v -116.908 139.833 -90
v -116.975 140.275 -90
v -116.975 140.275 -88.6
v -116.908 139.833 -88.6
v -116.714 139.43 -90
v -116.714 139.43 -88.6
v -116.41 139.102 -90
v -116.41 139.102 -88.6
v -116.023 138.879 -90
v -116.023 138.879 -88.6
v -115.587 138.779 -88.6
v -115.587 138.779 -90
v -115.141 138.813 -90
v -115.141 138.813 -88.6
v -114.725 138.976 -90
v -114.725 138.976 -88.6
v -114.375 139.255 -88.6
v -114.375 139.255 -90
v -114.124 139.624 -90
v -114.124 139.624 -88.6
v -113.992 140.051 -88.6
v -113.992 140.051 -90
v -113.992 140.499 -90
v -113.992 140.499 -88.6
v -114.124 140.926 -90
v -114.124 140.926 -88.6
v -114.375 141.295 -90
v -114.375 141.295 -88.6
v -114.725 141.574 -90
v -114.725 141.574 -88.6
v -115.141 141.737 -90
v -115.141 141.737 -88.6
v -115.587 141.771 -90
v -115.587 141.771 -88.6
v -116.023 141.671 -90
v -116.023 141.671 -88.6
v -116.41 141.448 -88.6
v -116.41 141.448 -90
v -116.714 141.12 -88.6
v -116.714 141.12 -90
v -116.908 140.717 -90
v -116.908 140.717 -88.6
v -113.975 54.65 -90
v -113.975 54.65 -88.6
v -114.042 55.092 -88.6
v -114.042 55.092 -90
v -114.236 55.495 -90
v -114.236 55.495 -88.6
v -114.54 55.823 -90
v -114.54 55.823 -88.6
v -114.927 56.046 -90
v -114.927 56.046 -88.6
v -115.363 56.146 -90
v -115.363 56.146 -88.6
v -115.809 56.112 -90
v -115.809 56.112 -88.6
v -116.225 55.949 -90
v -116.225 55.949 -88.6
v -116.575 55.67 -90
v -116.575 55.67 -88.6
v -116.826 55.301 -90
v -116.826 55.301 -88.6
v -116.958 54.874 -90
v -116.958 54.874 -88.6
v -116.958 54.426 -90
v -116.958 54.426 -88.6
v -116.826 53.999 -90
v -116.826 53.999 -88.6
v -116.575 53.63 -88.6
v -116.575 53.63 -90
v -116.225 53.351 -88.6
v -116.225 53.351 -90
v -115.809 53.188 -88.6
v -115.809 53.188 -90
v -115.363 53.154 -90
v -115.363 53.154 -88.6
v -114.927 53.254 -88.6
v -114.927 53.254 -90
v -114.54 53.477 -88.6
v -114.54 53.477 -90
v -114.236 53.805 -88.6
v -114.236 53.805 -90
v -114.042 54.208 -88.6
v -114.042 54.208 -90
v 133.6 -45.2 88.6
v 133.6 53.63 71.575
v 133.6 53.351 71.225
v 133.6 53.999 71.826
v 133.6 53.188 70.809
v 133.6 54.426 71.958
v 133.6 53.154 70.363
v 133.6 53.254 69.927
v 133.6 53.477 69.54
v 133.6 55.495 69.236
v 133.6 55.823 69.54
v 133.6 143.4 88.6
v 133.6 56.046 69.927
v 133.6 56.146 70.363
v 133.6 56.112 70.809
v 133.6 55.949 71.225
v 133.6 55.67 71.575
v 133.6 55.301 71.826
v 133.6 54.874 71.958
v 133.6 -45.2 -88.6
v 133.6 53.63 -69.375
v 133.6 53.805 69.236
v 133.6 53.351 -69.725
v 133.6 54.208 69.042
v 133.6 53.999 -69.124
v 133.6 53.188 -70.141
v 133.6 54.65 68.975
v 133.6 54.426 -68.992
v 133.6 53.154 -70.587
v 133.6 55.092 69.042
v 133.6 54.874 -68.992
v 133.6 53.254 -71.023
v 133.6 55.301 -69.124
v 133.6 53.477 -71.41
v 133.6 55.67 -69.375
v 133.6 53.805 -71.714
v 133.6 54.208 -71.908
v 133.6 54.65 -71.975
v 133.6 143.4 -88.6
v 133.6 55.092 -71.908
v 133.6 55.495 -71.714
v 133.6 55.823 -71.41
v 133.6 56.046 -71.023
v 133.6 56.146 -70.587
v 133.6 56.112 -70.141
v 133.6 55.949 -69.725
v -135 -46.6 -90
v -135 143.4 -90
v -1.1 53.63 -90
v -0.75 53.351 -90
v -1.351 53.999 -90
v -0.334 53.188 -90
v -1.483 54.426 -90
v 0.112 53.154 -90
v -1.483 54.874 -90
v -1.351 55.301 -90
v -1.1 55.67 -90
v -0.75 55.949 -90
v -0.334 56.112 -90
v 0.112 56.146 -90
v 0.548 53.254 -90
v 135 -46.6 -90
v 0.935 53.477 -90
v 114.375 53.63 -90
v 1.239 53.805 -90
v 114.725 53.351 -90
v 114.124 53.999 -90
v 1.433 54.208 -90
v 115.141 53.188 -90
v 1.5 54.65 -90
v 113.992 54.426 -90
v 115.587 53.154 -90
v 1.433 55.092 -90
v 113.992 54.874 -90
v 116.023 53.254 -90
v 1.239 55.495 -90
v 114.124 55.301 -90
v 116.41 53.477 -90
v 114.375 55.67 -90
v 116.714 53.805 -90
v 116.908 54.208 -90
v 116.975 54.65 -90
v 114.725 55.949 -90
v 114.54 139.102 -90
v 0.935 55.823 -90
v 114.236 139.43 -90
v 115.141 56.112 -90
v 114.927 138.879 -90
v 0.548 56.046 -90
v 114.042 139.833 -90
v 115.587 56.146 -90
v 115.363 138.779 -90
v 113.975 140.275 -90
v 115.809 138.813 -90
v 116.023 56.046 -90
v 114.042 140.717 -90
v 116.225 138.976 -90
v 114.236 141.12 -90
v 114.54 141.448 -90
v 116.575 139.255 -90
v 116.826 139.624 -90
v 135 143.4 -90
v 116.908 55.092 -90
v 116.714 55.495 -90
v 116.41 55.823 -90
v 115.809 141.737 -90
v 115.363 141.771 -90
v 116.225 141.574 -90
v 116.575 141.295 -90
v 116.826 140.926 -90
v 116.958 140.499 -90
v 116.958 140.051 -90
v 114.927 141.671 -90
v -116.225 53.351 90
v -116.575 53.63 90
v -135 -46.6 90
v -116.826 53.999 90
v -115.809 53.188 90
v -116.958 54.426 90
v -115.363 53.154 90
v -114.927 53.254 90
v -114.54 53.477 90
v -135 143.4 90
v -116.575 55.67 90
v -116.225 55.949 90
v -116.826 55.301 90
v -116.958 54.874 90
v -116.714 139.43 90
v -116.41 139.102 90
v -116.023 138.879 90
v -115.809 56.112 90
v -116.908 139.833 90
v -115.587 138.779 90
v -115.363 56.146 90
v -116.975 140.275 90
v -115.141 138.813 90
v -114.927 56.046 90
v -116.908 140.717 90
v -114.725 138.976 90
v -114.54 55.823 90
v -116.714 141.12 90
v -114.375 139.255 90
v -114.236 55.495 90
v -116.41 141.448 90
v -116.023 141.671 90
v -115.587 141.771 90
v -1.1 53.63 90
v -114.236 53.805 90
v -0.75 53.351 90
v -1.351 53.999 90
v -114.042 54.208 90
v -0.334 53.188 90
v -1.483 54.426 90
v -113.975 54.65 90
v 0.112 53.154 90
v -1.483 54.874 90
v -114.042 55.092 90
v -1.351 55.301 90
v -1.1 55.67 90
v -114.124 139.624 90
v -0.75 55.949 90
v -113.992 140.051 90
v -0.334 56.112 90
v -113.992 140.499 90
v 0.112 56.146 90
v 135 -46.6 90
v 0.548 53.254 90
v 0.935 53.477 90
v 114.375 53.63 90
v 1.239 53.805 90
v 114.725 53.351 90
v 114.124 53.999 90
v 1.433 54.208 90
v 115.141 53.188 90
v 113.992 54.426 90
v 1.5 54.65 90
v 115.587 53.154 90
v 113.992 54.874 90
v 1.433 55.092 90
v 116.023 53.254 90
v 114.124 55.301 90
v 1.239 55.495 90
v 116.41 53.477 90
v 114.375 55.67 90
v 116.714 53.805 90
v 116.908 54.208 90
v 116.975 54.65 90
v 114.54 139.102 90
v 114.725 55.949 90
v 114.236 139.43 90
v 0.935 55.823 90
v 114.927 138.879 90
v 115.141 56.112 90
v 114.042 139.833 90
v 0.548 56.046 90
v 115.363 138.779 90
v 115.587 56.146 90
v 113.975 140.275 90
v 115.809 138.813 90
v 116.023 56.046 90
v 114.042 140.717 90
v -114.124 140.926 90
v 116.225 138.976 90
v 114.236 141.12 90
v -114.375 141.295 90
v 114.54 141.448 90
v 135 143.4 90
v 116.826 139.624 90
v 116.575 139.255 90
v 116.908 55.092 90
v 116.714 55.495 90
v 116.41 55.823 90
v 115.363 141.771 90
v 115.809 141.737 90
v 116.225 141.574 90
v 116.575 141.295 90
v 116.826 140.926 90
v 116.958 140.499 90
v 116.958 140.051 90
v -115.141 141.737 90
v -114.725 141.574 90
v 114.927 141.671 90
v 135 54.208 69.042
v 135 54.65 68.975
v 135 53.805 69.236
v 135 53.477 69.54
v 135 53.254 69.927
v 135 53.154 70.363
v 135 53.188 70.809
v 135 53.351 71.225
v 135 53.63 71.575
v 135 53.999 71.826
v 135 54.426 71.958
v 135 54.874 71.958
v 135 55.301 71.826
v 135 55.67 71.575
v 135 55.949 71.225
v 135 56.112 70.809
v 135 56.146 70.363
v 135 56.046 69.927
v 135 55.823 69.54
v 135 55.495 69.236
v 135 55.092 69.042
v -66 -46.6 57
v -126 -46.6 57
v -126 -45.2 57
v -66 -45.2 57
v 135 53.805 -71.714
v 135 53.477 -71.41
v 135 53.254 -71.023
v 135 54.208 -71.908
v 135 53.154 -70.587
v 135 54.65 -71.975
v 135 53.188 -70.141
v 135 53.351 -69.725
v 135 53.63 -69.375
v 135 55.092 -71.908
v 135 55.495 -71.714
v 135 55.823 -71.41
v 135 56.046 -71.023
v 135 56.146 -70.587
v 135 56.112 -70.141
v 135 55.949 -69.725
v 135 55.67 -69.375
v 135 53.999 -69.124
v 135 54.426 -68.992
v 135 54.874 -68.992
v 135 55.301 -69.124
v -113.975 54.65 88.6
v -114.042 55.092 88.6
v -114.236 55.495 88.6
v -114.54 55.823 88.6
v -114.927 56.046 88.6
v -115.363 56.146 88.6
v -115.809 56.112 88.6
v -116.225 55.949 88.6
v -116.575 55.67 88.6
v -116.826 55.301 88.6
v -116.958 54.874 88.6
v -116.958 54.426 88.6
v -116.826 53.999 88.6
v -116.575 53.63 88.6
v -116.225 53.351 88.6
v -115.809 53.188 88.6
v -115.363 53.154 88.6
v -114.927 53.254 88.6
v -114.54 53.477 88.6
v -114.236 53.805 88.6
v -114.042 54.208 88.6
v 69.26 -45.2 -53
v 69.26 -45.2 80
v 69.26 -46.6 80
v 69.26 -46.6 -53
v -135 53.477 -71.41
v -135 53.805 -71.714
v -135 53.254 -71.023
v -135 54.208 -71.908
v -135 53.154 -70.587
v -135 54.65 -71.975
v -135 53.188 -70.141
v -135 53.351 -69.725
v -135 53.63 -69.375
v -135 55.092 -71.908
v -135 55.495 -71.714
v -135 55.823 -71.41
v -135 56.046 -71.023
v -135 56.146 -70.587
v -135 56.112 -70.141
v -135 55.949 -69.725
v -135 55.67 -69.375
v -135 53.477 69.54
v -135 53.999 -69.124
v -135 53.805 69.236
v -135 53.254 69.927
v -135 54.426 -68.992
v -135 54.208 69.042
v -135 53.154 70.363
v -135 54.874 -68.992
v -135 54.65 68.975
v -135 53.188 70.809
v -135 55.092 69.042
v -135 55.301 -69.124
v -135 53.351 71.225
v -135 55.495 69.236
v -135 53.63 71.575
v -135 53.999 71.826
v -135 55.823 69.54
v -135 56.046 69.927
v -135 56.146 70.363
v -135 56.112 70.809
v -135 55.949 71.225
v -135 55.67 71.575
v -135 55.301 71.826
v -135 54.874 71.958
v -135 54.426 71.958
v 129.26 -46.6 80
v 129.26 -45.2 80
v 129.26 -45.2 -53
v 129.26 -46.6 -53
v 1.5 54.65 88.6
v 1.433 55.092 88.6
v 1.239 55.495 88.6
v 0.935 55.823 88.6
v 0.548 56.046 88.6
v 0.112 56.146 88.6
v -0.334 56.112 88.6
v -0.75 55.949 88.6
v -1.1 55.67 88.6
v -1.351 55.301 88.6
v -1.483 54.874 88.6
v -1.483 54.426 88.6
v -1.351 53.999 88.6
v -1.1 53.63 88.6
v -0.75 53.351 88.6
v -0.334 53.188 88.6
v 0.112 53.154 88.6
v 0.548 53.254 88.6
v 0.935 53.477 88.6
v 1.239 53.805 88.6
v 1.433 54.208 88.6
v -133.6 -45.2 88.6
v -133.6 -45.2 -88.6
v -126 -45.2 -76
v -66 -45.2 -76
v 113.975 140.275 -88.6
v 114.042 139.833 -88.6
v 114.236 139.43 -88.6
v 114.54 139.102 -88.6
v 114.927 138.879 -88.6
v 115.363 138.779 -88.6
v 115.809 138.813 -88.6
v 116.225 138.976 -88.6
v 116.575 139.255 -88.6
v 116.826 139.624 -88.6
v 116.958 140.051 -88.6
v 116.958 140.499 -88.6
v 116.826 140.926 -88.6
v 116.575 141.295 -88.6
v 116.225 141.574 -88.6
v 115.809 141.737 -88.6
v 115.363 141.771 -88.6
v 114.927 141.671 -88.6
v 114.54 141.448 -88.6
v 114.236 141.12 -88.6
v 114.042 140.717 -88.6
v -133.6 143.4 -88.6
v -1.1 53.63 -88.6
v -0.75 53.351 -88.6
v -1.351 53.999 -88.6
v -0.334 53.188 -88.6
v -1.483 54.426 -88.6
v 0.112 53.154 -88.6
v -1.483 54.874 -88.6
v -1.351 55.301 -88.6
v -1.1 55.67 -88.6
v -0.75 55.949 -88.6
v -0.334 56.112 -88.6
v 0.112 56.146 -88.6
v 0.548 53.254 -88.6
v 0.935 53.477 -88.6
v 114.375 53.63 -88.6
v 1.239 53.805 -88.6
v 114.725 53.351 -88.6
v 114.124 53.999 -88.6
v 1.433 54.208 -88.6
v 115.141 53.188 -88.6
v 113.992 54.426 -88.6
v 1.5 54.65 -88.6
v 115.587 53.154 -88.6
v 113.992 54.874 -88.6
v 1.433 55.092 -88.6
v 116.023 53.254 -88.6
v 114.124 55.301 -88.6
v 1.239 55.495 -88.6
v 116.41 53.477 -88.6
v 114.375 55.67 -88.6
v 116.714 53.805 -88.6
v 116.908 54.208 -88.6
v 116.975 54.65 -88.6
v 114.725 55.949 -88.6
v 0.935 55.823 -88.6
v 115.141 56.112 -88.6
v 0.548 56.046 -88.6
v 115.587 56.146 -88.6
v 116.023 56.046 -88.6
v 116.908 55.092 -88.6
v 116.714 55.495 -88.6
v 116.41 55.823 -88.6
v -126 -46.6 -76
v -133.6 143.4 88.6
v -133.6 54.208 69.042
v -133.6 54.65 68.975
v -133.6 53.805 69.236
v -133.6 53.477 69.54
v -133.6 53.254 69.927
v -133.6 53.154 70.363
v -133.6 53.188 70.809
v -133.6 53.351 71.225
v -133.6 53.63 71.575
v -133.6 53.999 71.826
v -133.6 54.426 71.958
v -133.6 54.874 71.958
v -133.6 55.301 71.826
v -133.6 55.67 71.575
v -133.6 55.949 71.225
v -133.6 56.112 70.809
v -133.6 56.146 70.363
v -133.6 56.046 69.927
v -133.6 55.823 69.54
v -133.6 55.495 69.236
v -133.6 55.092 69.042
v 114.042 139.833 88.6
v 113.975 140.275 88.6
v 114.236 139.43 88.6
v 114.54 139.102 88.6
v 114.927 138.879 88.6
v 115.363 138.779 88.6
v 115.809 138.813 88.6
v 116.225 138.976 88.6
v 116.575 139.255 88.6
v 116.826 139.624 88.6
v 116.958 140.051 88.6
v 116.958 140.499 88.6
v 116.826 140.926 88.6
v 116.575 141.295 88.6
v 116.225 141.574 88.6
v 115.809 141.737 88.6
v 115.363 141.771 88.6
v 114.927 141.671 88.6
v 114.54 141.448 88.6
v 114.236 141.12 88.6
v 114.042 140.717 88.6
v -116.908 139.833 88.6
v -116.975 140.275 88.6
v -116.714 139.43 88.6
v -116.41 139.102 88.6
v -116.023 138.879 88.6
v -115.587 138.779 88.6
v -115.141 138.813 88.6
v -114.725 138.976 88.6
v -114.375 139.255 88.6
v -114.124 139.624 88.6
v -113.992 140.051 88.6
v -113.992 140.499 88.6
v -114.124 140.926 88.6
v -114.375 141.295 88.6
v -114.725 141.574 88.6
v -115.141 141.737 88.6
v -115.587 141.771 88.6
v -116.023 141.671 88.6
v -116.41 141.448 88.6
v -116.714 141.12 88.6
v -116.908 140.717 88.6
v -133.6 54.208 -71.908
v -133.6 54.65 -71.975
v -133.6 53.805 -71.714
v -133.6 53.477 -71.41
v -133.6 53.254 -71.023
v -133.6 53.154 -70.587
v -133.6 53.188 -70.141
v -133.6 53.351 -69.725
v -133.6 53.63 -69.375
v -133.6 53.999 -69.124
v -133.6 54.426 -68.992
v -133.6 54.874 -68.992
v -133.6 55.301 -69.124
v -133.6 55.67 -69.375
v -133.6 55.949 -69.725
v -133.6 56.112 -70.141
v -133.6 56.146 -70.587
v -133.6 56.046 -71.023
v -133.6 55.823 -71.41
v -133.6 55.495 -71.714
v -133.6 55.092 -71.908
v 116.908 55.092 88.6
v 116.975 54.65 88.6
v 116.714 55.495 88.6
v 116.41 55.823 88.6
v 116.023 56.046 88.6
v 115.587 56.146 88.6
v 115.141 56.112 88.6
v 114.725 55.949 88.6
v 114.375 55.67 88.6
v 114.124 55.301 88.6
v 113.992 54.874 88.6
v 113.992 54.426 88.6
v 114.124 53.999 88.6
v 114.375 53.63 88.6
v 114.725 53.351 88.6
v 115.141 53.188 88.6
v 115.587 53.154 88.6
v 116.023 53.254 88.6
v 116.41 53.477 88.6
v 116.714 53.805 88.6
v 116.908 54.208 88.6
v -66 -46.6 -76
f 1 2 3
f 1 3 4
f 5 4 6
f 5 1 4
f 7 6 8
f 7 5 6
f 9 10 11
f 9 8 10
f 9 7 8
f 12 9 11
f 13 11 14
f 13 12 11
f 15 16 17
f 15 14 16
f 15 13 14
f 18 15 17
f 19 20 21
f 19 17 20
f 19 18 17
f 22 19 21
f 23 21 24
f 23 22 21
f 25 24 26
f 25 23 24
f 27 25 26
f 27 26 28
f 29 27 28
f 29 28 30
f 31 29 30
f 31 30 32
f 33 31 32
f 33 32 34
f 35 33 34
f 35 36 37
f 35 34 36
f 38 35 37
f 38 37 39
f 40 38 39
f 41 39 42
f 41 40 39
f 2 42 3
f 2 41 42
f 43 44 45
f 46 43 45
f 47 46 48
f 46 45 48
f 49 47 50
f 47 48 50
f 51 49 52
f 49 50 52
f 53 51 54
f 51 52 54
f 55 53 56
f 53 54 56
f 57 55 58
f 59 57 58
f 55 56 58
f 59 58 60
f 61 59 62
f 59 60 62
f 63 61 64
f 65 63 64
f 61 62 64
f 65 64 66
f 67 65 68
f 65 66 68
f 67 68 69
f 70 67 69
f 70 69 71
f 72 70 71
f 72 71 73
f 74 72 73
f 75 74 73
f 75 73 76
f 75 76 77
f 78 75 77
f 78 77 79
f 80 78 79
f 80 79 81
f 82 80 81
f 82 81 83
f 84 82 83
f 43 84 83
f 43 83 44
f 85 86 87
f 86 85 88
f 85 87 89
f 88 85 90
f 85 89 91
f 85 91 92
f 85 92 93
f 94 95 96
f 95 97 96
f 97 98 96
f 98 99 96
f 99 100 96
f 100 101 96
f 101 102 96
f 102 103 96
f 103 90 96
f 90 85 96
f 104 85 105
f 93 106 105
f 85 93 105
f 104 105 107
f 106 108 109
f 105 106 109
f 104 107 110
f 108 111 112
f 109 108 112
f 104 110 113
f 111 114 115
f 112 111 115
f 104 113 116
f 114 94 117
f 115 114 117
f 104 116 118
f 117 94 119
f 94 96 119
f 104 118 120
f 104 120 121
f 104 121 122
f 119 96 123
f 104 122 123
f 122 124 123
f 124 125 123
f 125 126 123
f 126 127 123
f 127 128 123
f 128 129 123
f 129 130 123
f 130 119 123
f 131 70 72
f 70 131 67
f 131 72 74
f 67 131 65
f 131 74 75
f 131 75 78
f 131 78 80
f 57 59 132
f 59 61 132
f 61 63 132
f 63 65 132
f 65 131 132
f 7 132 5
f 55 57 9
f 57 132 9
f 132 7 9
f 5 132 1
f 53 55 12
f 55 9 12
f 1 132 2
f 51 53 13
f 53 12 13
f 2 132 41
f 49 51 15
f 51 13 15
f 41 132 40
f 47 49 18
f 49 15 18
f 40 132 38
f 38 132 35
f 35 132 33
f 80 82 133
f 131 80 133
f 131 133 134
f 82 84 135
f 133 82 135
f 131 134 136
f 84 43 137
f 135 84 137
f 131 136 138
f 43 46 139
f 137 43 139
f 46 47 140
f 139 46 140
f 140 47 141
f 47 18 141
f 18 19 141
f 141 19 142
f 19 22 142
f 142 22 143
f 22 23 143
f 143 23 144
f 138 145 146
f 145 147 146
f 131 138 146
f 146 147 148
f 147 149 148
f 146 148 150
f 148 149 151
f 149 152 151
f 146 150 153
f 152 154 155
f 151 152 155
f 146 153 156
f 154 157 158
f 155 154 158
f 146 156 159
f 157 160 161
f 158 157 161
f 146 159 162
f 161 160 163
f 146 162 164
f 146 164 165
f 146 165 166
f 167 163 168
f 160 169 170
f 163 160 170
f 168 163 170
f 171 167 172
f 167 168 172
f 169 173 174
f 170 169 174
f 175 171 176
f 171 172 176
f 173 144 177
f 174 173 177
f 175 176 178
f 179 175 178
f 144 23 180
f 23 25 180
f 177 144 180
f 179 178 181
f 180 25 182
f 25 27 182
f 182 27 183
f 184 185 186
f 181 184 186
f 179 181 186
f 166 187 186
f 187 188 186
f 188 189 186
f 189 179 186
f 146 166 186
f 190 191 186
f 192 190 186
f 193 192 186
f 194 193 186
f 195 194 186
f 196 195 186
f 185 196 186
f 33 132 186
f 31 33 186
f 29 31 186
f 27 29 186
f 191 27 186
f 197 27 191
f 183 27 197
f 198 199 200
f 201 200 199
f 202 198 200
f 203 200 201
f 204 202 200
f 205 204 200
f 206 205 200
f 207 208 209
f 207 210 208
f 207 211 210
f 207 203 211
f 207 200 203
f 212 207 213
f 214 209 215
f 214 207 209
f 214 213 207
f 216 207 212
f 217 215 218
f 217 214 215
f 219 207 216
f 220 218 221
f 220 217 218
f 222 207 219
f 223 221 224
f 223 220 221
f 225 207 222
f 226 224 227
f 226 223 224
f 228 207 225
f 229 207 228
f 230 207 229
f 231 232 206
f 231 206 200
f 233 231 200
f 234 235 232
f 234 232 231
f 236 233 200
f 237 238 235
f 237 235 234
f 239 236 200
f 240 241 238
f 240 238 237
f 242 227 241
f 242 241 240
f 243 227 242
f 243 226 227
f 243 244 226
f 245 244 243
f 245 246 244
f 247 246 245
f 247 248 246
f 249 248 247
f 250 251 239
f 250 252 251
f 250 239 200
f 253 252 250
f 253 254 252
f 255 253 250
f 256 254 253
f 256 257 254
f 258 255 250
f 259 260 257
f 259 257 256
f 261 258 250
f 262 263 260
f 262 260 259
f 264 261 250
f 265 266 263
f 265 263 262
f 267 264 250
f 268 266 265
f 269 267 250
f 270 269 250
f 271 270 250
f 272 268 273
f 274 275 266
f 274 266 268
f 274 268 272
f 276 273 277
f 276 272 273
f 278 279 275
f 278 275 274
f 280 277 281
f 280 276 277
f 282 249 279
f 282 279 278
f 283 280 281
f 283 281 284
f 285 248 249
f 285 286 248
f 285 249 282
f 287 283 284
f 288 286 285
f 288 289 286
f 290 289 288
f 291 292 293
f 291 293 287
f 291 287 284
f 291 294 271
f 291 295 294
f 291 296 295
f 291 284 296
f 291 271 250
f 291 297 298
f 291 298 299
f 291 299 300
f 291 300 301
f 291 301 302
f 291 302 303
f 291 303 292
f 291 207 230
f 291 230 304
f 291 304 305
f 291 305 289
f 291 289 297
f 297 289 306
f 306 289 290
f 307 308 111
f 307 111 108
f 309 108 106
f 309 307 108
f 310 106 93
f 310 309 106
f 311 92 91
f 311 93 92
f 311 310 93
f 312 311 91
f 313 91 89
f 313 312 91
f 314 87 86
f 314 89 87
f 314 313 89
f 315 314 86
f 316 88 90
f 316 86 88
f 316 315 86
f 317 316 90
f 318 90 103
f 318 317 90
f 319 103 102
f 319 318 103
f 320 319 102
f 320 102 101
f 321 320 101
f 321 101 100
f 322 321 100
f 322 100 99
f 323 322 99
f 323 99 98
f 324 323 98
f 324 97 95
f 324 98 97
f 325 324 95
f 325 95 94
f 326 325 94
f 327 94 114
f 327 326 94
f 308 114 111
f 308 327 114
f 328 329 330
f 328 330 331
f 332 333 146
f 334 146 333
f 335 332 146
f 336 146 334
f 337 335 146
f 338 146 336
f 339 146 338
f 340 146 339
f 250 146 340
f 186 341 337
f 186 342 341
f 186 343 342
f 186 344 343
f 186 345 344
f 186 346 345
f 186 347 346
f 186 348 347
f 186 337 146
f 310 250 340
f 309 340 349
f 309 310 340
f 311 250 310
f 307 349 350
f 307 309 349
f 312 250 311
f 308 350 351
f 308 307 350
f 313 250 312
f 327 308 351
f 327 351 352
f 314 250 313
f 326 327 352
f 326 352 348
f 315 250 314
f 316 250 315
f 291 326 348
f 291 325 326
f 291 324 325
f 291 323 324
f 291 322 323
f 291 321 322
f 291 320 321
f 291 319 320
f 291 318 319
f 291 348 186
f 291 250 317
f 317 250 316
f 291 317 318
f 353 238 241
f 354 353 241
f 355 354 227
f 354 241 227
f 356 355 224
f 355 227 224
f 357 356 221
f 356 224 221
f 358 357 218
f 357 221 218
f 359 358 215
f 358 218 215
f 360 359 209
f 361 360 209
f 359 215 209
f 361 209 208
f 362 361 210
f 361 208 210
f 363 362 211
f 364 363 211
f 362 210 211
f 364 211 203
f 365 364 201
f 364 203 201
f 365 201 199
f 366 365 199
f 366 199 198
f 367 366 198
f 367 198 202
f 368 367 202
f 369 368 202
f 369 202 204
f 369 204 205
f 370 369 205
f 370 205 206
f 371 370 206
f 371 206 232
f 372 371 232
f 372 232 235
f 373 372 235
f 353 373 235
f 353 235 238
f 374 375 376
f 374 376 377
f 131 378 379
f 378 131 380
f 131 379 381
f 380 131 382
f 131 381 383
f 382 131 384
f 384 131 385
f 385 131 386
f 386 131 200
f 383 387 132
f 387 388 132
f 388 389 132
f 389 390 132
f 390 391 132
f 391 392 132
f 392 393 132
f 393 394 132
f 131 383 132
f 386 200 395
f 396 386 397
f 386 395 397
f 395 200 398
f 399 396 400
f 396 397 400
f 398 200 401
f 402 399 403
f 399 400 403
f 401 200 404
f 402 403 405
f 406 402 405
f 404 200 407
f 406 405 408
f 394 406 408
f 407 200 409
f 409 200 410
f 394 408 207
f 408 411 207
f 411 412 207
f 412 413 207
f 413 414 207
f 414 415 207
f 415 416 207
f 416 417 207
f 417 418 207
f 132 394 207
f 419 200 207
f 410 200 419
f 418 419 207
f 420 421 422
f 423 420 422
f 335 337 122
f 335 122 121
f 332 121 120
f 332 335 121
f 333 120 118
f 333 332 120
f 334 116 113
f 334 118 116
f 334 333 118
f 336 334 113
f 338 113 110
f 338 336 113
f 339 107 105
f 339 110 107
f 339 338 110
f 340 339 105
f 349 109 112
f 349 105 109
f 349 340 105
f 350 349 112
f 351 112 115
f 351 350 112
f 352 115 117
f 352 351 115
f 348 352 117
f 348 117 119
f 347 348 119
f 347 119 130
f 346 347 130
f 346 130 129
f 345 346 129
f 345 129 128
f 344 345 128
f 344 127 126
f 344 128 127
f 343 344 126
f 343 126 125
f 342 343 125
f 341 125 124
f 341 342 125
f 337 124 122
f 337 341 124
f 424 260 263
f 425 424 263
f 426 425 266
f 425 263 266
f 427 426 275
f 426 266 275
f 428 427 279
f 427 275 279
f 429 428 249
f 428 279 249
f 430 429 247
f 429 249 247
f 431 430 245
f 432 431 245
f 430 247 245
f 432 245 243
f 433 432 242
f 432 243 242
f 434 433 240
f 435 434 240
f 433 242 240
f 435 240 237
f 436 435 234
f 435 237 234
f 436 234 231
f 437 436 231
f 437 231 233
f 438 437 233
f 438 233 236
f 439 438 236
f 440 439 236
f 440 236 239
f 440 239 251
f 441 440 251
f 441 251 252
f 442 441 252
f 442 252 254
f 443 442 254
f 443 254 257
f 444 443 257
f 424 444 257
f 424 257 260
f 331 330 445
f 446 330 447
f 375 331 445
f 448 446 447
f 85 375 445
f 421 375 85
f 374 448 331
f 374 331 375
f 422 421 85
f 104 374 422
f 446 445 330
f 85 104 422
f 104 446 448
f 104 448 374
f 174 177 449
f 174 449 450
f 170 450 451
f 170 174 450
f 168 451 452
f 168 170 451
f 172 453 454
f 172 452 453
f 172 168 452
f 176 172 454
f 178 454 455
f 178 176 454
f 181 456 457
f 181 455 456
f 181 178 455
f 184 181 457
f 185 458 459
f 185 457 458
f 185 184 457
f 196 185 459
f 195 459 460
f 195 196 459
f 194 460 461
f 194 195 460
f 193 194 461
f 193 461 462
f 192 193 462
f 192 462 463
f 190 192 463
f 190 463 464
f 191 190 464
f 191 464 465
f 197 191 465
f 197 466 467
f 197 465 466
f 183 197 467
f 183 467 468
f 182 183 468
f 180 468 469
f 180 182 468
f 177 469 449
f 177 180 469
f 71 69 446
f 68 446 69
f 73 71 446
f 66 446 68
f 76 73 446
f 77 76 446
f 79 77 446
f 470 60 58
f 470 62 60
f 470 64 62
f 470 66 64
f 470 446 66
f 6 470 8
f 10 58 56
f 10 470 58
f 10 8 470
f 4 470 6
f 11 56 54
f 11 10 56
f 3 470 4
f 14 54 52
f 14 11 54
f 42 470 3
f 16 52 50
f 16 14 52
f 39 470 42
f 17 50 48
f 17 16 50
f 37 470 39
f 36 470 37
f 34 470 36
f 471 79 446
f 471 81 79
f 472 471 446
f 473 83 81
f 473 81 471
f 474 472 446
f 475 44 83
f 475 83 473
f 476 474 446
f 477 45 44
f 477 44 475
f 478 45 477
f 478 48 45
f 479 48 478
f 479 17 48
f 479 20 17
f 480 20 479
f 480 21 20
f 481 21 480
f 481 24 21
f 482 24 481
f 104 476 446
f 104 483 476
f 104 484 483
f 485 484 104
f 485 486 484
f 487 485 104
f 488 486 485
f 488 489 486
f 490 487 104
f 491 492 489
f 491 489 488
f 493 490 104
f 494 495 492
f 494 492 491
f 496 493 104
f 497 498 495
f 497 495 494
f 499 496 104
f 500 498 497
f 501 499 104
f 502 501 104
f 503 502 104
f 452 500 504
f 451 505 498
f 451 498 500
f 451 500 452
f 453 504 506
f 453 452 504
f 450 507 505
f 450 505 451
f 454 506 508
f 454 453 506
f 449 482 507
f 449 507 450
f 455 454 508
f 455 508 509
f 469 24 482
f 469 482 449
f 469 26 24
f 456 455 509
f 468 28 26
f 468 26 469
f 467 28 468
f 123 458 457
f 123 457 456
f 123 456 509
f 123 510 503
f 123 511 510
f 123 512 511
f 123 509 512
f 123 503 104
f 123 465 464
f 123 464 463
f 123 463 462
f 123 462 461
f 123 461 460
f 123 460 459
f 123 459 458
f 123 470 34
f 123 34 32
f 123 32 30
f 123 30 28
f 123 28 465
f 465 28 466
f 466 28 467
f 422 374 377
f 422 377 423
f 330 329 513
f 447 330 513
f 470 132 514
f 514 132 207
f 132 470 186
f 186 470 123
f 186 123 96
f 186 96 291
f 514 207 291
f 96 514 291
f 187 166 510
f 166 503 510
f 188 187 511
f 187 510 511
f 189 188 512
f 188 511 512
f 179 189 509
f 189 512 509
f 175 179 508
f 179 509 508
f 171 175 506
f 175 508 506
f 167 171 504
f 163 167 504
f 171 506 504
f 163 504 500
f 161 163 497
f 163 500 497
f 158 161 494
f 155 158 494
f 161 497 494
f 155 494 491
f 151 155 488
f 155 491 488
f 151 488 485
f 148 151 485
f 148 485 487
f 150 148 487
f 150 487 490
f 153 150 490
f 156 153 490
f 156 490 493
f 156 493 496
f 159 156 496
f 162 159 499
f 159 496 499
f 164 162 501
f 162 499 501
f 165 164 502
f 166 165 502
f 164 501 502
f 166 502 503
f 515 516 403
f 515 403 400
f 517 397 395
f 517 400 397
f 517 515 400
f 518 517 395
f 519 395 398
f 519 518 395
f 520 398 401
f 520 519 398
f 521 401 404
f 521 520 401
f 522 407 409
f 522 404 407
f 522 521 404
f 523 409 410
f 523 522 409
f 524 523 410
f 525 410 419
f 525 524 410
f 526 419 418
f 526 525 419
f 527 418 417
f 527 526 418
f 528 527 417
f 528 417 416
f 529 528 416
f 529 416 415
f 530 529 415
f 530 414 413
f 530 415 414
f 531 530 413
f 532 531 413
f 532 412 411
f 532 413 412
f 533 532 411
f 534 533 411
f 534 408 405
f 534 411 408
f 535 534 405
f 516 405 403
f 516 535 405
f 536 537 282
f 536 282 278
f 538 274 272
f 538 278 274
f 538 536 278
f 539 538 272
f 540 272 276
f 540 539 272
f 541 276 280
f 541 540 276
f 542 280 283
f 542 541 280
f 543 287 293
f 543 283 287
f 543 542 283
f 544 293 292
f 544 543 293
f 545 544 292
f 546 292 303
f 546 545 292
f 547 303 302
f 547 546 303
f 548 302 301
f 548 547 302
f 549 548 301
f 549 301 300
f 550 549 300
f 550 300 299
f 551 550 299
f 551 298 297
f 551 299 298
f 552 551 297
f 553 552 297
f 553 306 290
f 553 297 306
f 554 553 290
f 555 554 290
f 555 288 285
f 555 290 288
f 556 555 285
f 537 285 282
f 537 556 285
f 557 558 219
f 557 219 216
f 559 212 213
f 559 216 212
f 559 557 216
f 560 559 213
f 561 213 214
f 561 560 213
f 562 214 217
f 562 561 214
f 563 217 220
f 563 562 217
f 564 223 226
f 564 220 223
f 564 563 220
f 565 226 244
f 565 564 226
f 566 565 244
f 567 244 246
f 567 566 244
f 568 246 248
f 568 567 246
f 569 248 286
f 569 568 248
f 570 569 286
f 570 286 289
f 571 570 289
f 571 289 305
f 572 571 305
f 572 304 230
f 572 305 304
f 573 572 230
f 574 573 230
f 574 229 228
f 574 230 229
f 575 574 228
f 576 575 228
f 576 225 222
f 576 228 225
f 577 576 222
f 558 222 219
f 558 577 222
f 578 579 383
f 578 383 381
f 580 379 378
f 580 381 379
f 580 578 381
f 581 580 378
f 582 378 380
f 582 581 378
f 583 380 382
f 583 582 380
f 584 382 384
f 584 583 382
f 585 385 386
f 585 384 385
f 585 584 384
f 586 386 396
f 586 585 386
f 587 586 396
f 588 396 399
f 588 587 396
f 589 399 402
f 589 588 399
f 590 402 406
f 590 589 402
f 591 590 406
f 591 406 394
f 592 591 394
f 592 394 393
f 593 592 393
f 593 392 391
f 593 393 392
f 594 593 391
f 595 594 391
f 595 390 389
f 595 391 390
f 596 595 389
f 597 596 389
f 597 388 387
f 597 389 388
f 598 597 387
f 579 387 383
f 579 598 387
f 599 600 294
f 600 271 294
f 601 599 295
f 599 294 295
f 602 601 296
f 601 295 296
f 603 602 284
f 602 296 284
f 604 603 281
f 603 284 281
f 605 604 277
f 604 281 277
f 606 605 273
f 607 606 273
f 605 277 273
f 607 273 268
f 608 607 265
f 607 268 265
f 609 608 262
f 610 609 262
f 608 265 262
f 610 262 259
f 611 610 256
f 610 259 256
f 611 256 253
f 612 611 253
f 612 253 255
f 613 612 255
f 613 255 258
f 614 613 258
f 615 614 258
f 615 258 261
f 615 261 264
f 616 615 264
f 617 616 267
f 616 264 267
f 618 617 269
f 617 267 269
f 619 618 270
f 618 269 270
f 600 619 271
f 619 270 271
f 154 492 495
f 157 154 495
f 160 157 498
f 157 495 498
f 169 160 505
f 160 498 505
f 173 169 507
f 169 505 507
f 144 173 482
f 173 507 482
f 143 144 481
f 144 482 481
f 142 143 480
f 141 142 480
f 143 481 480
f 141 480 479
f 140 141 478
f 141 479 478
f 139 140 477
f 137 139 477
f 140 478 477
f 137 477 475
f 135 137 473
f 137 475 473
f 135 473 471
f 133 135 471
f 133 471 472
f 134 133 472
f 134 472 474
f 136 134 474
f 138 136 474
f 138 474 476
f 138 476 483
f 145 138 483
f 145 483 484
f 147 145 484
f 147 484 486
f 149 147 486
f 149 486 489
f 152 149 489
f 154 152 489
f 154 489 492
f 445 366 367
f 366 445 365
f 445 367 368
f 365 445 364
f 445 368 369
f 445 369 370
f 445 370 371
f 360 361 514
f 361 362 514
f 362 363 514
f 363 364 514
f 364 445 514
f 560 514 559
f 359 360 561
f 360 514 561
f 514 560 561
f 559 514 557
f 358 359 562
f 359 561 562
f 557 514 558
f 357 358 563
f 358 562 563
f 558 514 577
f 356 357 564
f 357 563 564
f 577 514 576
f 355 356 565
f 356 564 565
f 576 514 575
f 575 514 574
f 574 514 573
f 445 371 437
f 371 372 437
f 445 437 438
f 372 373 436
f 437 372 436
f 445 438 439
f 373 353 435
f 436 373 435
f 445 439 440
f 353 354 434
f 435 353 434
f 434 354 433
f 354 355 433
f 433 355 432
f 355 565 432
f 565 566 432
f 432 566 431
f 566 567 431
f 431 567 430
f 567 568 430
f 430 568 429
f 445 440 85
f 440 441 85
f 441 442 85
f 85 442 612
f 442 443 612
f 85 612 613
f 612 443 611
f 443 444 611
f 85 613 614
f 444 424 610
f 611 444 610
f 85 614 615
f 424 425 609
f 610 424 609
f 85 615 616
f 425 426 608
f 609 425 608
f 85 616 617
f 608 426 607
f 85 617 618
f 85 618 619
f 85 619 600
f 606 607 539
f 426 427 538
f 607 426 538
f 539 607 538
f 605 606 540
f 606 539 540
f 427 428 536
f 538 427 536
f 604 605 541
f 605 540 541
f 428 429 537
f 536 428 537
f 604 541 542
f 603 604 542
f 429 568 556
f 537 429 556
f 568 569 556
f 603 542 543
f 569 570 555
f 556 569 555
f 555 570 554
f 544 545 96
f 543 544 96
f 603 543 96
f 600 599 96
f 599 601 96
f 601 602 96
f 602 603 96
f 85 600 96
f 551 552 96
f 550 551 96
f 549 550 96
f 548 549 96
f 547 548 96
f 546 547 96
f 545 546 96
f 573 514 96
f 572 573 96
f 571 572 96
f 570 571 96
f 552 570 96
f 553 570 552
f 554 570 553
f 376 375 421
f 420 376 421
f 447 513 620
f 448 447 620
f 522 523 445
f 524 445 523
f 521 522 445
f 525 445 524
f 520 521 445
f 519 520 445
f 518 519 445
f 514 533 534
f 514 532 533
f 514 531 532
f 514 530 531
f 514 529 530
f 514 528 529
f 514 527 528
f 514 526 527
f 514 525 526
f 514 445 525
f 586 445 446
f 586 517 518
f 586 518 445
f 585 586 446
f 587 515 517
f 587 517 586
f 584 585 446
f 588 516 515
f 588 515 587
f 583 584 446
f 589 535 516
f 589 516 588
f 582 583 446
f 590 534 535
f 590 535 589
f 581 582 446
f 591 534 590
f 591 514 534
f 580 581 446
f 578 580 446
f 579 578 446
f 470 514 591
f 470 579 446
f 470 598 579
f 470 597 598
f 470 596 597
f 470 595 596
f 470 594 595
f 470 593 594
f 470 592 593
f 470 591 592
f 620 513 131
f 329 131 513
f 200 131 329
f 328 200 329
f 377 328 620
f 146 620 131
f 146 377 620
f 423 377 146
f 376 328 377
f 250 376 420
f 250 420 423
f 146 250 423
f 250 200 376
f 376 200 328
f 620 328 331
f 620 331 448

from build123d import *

# Parameters (mm, degrees)
CROQUIS1_W                 = 270
CROQUIS1_H                 = 190
SALIENTE_EXTRUIR1_DEPTH    = 90
CROQUIS2_W                 = 60
CROQUIS2_H                 = 133
CORTAR_EXTRUIR2_DEPTH      = 35.7
CROQUIS6_W                 = 267.2
CROQUIS6_H                 = 177.2
CORTAR_EXTRUIR3_DEPTH      = 188.6
CROQUIS8_R                 = 1.5
CORTAR_EXTRUIR4_DEPTH      = 300
CORTAR_EXTRUIR6_DEPTH      = 135
CORTAR_EXTRUIR6_DEPTH_BACK = 368
CROQUIS10_R                = 1.5
CORTAR_EXTRUIR7_DEPTH      = 112
CORTAR_EXTRUIR7_DEPTH_BACK = 260.1
CROQUIS11_R                = 1.5


with BuildPart() as part:
    # Croquis1 → Saliente-Extruir1 (new, symmetric)
    with BuildSketch(Plane.XY):
        with Locations((0, 48.4)):
            Rectangle(CROQUIS1_W, CROQUIS1_H)
    extrude(amount=SALIENTE_EXTRUIR1_DEPTH, both=True)

    # Croquis2 → Cortar-Extruir2 (cut, symmetric)
    with BuildSketch(Plane(origin=(0, -46.6, 0), x_dir=(1, 0, 0), z_dir=(0, 1, 0))):
        with Locations((-96, 9.5)):
            Rectangle(CROQUIS2_W, CROQUIS2_H)
        with Locations((99.26, -13.5)):
            Rectangle(CROQUIS2_W, CROQUIS2_H)
    extrude(amount=CORTAR_EXTRUIR2_DEPTH, both=True, mode=Mode.SUBTRACT)

    # Croquis6 → Cortar-Extruir3 (cut)
    with BuildSketch(Plane(origin=(0, 143.4, 0), x_dir=(1, 0, 0), z_dir=(0, 1, 0))):
        Rectangle(CROQUIS6_W, CROQUIS6_H)
    extrude(amount=-CORTAR_EXTRUIR3_DEPTH, mode=Mode.SUBTRACT)

    # Croquis8 → Cortar-Extruir4 (cut, symmetric)
    with BuildSketch(Plane.XY.offset(90)):
        with Locations((-115.475, 54.65)):
            Circle(CROQUIS8_R)
        with Locations((0, 54.65)):
            Circle(CROQUIS8_R)
        with Locations((115.475, 54.65)):
            Circle(CROQUIS8_R)
    extrude(amount=CORTAR_EXTRUIR4_DEPTH, both=True, mode=Mode.SUBTRACT)

    # Croquis10 → Cortar-Extruir6 (cut, two sides: drawn at the far end of the back side and taken through both)
    with BuildSketch(Plane.ZY.offset(135).offset(-CORTAR_EXTRUIR6_DEPTH_BACK)):
        with Locations(Location((-70.475, 54.65, 0), (0, 0, 180))):
            Circle(CROQUIS10_R)
        with Locations(Location((70.475, 54.65, 0), (0, 0, 180))):
            Circle(CROQUIS10_R)
    extrude(amount=CORTAR_EXTRUIR6_DEPTH + CORTAR_EXTRUIR6_DEPTH_BACK, mode=Mode.SUBTRACT)

    # Croquis11 → Cortar-Extruir7 (cut, two sides: drawn at the far end of the back side and taken through both)
    with BuildSketch(Plane.XY.offset(90).offset(-CORTAR_EXTRUIR7_DEPTH_BACK)):
        with Locations(Location((-115.475, 140.275, 0), (0, 0, 180))):
            Circle(CROQUIS11_R)
        with Locations(Location((115.475, 140.275, 0), (0, 0, 180))):
            Circle(CROQUIS11_R)
    extrude(amount=CORTAR_EXTRUIR7_DEPTH + CORTAR_EXTRUIR7_DEPTH_BACK, mode=Mode.SUBTRACT)


solid = part.part
